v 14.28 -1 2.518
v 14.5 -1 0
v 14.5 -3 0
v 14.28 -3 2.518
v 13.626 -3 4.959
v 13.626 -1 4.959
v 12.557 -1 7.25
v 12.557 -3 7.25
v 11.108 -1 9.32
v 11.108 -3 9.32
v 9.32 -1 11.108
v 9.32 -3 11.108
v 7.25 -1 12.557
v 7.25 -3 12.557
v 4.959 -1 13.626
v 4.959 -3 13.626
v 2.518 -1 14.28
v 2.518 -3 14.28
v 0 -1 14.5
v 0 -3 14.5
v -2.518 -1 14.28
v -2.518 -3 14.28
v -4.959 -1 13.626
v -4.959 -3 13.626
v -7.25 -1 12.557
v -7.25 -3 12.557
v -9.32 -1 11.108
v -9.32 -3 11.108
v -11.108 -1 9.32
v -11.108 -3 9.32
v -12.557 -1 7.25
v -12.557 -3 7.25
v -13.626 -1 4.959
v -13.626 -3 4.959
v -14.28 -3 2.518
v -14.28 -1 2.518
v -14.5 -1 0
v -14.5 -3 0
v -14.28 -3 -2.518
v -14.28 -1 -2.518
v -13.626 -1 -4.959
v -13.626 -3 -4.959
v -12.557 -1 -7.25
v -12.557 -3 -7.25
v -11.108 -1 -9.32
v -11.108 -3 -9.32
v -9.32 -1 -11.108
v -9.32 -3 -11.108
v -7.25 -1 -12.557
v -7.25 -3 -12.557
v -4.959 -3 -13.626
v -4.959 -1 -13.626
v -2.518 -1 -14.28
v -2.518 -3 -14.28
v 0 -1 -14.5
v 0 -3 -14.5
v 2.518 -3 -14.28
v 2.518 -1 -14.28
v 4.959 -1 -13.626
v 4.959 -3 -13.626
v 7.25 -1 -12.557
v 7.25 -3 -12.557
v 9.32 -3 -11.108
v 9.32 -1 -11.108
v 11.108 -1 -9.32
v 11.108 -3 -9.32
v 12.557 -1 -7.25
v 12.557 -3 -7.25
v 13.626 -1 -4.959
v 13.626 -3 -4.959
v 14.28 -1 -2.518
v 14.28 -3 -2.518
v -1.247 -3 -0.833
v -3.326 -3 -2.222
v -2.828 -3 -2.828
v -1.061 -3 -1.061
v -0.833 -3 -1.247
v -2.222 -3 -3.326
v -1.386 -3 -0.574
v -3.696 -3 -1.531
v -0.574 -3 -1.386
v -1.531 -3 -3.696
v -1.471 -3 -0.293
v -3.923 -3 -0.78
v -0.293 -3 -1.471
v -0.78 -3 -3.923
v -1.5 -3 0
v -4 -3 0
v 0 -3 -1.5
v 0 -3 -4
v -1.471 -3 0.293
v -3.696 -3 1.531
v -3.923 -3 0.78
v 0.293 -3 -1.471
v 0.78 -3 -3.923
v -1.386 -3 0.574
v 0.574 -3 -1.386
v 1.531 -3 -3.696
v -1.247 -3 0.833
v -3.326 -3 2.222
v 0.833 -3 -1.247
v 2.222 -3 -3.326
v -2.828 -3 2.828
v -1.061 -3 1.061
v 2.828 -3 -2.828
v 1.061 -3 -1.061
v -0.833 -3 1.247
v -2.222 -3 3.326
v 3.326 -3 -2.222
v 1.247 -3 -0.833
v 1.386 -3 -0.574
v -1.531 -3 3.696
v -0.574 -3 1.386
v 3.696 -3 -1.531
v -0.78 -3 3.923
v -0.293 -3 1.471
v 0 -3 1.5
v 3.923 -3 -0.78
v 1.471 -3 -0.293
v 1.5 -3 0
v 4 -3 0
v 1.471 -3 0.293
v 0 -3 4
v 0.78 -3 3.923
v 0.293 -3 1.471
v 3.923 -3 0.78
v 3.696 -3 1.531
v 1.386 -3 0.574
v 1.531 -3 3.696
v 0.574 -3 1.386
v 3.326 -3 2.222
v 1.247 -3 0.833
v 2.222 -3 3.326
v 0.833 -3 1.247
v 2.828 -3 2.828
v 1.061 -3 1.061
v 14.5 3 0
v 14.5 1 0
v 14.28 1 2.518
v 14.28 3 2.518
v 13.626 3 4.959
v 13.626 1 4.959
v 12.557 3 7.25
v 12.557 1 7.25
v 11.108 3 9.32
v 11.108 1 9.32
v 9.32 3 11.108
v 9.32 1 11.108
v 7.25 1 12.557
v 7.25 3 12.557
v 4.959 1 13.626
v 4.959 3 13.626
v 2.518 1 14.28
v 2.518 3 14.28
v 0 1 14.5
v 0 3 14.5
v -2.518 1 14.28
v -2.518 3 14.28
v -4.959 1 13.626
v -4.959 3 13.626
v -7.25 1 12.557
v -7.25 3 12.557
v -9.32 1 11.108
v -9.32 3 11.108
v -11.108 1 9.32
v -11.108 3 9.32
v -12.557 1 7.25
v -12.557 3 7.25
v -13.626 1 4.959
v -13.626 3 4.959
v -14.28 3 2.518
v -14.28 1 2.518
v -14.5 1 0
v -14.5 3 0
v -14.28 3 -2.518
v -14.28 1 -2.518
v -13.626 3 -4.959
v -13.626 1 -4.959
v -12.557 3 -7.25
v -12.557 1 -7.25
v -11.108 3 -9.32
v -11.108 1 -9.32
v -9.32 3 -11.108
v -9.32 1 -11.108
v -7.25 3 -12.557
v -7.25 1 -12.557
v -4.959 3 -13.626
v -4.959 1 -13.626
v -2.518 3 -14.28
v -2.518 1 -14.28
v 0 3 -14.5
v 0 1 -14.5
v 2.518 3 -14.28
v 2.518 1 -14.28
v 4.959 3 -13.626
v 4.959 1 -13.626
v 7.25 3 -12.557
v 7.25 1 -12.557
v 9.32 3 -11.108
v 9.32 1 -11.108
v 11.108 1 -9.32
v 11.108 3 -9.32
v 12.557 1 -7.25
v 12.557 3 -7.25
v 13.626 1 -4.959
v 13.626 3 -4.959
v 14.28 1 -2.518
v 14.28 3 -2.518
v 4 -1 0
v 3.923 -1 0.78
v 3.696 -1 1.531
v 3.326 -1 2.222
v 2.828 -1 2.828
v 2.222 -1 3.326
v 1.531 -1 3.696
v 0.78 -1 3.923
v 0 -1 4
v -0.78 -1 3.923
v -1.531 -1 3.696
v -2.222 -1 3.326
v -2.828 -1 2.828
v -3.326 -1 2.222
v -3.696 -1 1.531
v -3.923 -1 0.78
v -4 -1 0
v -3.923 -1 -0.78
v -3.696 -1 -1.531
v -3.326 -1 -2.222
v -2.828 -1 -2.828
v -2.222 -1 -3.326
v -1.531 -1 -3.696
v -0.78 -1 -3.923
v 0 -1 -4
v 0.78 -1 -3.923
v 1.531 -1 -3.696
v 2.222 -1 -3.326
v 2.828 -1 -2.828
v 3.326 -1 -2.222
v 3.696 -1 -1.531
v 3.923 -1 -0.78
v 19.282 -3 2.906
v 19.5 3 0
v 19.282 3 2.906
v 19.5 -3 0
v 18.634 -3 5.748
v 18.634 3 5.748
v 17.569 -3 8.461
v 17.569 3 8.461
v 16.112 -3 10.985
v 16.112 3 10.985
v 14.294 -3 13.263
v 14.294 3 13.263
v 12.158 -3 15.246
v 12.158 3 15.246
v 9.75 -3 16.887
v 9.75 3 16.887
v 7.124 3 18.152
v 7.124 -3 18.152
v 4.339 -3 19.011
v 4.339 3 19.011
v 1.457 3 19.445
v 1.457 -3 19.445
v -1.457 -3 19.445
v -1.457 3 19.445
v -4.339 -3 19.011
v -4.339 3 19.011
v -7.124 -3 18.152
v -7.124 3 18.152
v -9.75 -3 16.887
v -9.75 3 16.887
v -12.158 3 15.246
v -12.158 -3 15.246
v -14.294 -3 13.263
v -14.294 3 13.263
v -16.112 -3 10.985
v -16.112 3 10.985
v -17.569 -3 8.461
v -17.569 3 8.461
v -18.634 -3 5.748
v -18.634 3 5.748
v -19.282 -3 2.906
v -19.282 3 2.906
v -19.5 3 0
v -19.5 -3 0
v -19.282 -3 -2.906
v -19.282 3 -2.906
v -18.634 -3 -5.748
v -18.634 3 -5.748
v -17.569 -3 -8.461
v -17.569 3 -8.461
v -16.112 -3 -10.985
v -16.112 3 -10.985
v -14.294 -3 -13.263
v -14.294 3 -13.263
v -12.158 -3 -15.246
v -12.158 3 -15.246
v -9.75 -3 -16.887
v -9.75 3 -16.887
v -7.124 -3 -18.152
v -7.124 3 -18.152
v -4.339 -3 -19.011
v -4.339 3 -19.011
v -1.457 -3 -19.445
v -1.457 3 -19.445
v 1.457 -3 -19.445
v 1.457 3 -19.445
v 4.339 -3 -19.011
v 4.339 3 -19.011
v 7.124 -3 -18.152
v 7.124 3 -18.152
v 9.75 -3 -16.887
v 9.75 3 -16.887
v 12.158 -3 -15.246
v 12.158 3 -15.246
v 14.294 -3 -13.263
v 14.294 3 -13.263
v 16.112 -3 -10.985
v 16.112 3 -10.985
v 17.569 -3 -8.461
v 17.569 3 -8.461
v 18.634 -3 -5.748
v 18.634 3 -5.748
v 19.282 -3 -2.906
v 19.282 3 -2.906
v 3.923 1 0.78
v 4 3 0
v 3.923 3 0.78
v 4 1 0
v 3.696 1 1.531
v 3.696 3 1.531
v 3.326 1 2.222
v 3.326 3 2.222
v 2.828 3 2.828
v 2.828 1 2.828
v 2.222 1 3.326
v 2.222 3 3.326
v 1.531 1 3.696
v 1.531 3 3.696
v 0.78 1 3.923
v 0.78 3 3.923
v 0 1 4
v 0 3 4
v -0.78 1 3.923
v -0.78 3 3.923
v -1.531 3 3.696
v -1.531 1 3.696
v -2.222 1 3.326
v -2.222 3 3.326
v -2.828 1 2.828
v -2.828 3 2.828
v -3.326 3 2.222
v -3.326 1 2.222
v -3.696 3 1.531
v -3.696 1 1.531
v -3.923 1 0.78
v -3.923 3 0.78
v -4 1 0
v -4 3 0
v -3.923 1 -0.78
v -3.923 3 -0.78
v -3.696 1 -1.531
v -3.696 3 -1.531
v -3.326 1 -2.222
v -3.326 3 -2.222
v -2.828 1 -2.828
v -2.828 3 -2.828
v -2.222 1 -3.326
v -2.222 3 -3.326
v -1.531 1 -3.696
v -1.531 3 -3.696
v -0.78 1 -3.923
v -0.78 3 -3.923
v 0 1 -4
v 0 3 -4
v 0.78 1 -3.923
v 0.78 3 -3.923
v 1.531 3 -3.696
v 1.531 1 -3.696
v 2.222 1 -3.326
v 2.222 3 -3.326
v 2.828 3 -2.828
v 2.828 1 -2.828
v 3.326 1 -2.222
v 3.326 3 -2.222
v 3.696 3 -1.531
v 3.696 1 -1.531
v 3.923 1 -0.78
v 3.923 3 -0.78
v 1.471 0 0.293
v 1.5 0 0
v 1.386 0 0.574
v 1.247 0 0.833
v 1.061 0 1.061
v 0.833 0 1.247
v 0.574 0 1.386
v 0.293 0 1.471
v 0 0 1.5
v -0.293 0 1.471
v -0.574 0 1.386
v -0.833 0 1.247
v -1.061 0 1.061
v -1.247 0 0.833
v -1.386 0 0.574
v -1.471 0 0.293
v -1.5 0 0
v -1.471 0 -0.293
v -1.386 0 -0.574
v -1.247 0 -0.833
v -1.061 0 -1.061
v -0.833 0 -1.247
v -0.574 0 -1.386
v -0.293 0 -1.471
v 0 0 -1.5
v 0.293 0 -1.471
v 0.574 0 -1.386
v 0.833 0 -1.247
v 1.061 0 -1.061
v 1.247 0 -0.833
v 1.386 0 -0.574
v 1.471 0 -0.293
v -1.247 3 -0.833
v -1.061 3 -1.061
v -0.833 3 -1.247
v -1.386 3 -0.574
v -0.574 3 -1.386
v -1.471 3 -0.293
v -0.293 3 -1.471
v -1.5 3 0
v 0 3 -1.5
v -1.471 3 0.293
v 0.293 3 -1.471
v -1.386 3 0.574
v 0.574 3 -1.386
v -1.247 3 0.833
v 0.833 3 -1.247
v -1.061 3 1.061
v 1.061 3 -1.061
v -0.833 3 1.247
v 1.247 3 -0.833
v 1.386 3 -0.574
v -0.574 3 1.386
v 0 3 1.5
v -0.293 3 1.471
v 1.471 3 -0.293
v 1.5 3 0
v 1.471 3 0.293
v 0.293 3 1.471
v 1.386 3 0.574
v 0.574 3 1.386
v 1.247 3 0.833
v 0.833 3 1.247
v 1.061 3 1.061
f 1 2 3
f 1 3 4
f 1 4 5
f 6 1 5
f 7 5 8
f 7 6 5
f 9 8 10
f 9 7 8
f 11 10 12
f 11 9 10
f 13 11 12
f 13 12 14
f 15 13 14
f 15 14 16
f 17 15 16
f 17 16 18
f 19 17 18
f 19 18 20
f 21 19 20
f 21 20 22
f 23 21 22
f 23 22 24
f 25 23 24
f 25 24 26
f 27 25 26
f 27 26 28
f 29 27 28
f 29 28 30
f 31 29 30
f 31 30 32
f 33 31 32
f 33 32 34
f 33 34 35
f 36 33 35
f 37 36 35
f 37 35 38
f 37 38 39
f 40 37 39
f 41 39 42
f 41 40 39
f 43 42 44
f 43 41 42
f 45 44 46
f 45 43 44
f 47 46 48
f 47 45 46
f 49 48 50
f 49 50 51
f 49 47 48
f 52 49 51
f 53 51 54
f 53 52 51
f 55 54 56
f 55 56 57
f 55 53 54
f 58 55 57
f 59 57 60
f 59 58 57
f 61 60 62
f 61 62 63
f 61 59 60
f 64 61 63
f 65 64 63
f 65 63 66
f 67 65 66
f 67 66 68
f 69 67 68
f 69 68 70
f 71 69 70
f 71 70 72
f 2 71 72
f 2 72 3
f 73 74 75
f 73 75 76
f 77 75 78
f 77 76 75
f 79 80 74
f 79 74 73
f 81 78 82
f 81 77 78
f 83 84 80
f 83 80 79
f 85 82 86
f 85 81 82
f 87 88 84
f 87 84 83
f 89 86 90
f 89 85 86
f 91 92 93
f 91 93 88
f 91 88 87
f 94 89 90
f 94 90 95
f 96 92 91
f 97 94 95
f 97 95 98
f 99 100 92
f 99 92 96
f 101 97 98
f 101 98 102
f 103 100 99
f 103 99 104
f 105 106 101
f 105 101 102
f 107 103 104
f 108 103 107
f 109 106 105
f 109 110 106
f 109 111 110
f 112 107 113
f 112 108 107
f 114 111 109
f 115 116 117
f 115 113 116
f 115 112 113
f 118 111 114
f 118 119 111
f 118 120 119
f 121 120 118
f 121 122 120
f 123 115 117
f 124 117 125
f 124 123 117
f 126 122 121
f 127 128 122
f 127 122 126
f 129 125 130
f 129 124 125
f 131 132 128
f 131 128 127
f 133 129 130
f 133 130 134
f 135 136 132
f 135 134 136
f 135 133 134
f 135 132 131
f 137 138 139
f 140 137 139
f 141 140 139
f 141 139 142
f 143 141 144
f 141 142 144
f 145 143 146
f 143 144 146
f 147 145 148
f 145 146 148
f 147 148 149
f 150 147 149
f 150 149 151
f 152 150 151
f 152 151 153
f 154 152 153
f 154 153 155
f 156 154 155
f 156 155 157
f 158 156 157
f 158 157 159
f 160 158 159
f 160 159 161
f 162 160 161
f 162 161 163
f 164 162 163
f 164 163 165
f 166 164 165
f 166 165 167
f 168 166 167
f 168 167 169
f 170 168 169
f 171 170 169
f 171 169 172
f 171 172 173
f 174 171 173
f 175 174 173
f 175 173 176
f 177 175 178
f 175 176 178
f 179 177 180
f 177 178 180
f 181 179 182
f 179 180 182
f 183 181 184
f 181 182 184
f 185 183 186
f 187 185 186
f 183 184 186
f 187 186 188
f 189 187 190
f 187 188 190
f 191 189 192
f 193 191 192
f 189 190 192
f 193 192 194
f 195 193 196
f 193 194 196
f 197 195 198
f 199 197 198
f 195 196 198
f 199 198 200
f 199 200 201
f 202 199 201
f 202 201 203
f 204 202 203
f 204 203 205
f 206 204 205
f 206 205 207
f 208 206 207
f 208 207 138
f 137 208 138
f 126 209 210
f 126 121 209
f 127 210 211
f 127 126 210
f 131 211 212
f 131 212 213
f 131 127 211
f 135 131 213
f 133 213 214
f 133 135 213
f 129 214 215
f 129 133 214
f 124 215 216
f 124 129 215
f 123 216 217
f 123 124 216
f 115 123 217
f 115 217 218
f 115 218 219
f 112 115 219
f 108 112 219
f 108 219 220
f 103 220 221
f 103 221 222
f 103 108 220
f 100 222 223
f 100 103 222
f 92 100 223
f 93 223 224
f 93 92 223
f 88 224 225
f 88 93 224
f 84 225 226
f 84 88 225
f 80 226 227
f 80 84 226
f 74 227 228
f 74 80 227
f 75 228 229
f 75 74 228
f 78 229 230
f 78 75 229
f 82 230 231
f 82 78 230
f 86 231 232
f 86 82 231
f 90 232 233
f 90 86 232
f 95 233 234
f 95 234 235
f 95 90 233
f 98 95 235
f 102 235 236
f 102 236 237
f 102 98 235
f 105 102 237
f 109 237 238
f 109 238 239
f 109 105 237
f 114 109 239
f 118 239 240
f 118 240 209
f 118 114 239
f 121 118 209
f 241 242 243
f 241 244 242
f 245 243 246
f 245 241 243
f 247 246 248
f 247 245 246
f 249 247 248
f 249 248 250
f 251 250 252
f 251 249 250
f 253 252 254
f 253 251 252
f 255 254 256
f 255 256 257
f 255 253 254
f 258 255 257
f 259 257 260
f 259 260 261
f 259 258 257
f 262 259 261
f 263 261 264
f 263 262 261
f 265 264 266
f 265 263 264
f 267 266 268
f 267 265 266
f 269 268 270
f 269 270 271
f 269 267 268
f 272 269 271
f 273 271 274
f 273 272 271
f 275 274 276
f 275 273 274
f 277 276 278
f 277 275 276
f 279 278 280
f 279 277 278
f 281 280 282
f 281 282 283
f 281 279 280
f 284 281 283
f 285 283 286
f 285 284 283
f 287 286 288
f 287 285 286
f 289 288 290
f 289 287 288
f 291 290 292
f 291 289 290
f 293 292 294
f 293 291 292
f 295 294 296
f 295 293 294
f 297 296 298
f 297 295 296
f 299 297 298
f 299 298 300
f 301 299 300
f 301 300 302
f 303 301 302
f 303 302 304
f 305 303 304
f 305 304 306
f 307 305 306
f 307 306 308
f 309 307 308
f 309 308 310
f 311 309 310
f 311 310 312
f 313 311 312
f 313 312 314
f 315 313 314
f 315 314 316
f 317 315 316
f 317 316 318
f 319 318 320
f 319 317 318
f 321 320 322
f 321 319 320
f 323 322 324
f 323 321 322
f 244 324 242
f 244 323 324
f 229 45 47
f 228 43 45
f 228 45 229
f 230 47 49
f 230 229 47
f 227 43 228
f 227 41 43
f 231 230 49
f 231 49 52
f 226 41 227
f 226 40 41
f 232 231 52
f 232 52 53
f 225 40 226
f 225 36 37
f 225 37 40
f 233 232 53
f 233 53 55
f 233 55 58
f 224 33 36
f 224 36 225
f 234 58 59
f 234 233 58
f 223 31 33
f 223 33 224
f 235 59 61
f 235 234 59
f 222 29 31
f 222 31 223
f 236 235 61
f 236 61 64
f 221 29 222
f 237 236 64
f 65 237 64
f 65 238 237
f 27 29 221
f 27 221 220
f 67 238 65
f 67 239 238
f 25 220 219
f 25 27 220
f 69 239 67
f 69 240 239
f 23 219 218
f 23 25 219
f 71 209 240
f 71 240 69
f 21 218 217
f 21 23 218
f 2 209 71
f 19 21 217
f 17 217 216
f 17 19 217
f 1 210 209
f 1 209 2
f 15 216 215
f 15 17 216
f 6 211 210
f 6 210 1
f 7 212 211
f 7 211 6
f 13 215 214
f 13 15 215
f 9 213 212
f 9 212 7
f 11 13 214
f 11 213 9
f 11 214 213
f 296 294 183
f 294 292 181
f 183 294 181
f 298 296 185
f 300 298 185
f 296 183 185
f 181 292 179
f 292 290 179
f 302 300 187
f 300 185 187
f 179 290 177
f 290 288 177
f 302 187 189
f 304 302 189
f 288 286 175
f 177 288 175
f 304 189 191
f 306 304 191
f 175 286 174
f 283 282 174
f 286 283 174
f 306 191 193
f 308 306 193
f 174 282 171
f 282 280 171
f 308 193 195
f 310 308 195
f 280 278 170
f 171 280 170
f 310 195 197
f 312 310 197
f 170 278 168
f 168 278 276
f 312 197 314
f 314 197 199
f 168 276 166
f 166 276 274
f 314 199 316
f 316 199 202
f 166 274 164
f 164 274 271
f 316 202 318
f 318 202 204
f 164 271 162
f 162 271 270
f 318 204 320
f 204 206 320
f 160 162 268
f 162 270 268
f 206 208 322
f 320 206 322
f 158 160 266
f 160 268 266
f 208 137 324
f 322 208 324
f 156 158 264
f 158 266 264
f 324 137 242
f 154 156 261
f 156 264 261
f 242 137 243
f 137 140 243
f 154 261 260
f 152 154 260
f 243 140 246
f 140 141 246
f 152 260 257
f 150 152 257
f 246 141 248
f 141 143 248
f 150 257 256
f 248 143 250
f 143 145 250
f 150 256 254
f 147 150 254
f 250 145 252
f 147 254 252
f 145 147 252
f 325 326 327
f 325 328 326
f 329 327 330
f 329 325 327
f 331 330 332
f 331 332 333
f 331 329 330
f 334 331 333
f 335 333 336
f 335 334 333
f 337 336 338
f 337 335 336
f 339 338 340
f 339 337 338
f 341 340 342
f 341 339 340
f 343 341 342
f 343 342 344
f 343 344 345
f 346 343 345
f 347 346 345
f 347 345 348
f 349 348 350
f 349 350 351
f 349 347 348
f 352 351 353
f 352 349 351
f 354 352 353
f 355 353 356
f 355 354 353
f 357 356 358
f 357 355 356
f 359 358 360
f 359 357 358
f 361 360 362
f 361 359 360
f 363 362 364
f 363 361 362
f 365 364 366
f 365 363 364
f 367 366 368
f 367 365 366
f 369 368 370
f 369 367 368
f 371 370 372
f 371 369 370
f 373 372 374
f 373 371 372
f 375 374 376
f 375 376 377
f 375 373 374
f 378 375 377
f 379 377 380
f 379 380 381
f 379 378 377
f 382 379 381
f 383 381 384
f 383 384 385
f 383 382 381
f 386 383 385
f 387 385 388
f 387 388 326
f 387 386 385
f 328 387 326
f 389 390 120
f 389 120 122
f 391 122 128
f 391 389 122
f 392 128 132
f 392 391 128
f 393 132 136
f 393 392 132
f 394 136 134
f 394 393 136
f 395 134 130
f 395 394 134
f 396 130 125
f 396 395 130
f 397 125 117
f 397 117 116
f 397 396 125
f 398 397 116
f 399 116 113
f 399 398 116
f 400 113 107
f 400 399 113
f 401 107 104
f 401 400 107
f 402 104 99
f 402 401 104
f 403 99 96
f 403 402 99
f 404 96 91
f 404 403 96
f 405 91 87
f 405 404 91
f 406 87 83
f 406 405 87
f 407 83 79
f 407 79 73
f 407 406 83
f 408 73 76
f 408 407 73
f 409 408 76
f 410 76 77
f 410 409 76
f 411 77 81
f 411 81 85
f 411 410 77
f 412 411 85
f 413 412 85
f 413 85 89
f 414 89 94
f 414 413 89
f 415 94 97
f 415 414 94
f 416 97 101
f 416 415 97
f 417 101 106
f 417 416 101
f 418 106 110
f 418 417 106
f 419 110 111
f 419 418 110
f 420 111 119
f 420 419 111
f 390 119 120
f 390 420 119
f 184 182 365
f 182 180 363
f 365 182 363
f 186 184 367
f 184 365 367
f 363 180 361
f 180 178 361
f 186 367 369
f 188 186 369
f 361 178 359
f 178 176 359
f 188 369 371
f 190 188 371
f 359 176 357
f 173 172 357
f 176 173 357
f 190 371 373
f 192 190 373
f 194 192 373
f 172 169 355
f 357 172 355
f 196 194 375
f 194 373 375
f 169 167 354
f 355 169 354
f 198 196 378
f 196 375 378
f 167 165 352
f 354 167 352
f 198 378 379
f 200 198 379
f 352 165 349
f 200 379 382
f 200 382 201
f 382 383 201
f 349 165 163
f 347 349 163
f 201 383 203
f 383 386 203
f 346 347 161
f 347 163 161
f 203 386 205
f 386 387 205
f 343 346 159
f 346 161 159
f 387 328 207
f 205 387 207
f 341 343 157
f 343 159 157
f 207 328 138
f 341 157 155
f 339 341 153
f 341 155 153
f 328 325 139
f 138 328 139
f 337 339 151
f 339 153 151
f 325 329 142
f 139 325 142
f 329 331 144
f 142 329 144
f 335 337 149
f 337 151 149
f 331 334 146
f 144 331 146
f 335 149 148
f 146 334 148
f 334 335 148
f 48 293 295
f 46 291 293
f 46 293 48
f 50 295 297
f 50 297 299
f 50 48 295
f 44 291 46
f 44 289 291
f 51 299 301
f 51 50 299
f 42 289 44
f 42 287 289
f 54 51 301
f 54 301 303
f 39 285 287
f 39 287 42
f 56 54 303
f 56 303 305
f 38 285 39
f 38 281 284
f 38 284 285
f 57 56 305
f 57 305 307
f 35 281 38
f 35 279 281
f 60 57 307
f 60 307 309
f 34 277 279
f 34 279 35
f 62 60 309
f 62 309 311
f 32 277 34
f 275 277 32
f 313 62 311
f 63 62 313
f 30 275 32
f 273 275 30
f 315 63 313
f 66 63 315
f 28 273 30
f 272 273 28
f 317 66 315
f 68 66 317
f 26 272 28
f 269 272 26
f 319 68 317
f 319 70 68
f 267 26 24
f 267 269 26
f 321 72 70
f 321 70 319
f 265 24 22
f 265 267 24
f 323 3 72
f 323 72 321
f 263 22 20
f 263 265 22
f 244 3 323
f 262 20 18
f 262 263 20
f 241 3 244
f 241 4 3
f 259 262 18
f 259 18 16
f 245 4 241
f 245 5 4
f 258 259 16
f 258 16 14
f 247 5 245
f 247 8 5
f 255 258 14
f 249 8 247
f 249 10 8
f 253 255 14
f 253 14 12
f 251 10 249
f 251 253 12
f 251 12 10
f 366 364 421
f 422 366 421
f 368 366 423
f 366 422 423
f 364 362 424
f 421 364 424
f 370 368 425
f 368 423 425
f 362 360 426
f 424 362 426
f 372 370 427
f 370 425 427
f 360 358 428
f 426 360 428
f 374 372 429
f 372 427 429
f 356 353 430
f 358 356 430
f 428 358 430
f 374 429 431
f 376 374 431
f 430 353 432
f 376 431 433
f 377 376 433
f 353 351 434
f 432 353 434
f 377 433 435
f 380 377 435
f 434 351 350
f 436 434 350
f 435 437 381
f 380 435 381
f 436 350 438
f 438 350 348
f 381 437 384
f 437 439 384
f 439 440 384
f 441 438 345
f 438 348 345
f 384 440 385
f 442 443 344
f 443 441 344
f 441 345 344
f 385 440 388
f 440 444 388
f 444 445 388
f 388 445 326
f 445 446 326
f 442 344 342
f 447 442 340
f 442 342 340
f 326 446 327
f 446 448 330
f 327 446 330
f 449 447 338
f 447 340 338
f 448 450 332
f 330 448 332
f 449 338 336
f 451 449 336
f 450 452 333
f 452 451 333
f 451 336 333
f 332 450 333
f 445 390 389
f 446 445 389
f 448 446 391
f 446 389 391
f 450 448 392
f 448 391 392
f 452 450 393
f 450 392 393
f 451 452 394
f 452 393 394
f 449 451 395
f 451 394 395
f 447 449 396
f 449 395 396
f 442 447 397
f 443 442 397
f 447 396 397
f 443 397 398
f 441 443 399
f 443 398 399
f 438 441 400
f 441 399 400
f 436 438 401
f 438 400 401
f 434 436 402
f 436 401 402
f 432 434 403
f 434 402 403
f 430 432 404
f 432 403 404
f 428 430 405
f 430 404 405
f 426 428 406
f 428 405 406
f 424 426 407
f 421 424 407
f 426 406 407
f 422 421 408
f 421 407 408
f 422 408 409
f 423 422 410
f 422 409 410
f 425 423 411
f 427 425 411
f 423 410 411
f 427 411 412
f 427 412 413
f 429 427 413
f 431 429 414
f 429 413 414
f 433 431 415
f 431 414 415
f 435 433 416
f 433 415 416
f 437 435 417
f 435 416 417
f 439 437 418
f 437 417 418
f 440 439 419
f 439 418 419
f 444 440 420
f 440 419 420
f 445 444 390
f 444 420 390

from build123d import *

# Parameters (mm, degrees)
F0_R     = 4.000005
F0_R_2   = 1.499997
F1_DEPTH = 2.999994
F2_DEPTH = 2.999994
F0_R_3   = 14.499971
F3_DEPTH = 1.000001
F4_DEPTH = 1.000001
F0_R_4   = 19.499961
F5_DEPTH = 2.999994
F6_DEPTH = 2.999994


with BuildPart() as f1:
    # F0 (on Front) → F1 (new body)
    with BuildSketch(Plane.XZ):
        Circle(F0_R)
        Circle(F0_R_2, mode=Mode.SUBTRACT)
    extrude(amount=F1_DEPTH)

    # F0 (on Front) → F2 (join)
    with BuildSketch(Plane.XZ):
        Circle(F0_R)
        Circle(F0_R_2, mode=Mode.SUBTRACT)
    extrude(amount=-F2_DEPTH)

    # F0 (on Front) → F3 (join)
    with BuildSketch(Plane.XZ):
        Circle(F0_R_3)
        Circle(F0_R, mode=Mode.SUBTRACT)
    extrude(amount=F3_DEPTH)

    # F0 (on Front) → F4 (join)
    with BuildSketch(Plane.XZ):
        Circle(F0_R_3)
        Circle(F0_R, mode=Mode.SUBTRACT)
    extrude(amount=-F4_DEPTH)

    # F0 (on Front) → F5 (join)
    with BuildSketch(Plane.XZ):
        Circle(F0_R_4)
        Circle(F0_R_3, mode=Mode.SUBTRACT)
    extrude(amount=F5_DEPTH)

    # F0 (on Front) → F6 (join)
    with BuildSketch(Plane.XZ):
        Circle(F0_R_4)
        Circle(F0_R_3, mode=Mode.SUBTRACT)
    extrude(amount=-F6_DEPTH)


solid = f1.part
